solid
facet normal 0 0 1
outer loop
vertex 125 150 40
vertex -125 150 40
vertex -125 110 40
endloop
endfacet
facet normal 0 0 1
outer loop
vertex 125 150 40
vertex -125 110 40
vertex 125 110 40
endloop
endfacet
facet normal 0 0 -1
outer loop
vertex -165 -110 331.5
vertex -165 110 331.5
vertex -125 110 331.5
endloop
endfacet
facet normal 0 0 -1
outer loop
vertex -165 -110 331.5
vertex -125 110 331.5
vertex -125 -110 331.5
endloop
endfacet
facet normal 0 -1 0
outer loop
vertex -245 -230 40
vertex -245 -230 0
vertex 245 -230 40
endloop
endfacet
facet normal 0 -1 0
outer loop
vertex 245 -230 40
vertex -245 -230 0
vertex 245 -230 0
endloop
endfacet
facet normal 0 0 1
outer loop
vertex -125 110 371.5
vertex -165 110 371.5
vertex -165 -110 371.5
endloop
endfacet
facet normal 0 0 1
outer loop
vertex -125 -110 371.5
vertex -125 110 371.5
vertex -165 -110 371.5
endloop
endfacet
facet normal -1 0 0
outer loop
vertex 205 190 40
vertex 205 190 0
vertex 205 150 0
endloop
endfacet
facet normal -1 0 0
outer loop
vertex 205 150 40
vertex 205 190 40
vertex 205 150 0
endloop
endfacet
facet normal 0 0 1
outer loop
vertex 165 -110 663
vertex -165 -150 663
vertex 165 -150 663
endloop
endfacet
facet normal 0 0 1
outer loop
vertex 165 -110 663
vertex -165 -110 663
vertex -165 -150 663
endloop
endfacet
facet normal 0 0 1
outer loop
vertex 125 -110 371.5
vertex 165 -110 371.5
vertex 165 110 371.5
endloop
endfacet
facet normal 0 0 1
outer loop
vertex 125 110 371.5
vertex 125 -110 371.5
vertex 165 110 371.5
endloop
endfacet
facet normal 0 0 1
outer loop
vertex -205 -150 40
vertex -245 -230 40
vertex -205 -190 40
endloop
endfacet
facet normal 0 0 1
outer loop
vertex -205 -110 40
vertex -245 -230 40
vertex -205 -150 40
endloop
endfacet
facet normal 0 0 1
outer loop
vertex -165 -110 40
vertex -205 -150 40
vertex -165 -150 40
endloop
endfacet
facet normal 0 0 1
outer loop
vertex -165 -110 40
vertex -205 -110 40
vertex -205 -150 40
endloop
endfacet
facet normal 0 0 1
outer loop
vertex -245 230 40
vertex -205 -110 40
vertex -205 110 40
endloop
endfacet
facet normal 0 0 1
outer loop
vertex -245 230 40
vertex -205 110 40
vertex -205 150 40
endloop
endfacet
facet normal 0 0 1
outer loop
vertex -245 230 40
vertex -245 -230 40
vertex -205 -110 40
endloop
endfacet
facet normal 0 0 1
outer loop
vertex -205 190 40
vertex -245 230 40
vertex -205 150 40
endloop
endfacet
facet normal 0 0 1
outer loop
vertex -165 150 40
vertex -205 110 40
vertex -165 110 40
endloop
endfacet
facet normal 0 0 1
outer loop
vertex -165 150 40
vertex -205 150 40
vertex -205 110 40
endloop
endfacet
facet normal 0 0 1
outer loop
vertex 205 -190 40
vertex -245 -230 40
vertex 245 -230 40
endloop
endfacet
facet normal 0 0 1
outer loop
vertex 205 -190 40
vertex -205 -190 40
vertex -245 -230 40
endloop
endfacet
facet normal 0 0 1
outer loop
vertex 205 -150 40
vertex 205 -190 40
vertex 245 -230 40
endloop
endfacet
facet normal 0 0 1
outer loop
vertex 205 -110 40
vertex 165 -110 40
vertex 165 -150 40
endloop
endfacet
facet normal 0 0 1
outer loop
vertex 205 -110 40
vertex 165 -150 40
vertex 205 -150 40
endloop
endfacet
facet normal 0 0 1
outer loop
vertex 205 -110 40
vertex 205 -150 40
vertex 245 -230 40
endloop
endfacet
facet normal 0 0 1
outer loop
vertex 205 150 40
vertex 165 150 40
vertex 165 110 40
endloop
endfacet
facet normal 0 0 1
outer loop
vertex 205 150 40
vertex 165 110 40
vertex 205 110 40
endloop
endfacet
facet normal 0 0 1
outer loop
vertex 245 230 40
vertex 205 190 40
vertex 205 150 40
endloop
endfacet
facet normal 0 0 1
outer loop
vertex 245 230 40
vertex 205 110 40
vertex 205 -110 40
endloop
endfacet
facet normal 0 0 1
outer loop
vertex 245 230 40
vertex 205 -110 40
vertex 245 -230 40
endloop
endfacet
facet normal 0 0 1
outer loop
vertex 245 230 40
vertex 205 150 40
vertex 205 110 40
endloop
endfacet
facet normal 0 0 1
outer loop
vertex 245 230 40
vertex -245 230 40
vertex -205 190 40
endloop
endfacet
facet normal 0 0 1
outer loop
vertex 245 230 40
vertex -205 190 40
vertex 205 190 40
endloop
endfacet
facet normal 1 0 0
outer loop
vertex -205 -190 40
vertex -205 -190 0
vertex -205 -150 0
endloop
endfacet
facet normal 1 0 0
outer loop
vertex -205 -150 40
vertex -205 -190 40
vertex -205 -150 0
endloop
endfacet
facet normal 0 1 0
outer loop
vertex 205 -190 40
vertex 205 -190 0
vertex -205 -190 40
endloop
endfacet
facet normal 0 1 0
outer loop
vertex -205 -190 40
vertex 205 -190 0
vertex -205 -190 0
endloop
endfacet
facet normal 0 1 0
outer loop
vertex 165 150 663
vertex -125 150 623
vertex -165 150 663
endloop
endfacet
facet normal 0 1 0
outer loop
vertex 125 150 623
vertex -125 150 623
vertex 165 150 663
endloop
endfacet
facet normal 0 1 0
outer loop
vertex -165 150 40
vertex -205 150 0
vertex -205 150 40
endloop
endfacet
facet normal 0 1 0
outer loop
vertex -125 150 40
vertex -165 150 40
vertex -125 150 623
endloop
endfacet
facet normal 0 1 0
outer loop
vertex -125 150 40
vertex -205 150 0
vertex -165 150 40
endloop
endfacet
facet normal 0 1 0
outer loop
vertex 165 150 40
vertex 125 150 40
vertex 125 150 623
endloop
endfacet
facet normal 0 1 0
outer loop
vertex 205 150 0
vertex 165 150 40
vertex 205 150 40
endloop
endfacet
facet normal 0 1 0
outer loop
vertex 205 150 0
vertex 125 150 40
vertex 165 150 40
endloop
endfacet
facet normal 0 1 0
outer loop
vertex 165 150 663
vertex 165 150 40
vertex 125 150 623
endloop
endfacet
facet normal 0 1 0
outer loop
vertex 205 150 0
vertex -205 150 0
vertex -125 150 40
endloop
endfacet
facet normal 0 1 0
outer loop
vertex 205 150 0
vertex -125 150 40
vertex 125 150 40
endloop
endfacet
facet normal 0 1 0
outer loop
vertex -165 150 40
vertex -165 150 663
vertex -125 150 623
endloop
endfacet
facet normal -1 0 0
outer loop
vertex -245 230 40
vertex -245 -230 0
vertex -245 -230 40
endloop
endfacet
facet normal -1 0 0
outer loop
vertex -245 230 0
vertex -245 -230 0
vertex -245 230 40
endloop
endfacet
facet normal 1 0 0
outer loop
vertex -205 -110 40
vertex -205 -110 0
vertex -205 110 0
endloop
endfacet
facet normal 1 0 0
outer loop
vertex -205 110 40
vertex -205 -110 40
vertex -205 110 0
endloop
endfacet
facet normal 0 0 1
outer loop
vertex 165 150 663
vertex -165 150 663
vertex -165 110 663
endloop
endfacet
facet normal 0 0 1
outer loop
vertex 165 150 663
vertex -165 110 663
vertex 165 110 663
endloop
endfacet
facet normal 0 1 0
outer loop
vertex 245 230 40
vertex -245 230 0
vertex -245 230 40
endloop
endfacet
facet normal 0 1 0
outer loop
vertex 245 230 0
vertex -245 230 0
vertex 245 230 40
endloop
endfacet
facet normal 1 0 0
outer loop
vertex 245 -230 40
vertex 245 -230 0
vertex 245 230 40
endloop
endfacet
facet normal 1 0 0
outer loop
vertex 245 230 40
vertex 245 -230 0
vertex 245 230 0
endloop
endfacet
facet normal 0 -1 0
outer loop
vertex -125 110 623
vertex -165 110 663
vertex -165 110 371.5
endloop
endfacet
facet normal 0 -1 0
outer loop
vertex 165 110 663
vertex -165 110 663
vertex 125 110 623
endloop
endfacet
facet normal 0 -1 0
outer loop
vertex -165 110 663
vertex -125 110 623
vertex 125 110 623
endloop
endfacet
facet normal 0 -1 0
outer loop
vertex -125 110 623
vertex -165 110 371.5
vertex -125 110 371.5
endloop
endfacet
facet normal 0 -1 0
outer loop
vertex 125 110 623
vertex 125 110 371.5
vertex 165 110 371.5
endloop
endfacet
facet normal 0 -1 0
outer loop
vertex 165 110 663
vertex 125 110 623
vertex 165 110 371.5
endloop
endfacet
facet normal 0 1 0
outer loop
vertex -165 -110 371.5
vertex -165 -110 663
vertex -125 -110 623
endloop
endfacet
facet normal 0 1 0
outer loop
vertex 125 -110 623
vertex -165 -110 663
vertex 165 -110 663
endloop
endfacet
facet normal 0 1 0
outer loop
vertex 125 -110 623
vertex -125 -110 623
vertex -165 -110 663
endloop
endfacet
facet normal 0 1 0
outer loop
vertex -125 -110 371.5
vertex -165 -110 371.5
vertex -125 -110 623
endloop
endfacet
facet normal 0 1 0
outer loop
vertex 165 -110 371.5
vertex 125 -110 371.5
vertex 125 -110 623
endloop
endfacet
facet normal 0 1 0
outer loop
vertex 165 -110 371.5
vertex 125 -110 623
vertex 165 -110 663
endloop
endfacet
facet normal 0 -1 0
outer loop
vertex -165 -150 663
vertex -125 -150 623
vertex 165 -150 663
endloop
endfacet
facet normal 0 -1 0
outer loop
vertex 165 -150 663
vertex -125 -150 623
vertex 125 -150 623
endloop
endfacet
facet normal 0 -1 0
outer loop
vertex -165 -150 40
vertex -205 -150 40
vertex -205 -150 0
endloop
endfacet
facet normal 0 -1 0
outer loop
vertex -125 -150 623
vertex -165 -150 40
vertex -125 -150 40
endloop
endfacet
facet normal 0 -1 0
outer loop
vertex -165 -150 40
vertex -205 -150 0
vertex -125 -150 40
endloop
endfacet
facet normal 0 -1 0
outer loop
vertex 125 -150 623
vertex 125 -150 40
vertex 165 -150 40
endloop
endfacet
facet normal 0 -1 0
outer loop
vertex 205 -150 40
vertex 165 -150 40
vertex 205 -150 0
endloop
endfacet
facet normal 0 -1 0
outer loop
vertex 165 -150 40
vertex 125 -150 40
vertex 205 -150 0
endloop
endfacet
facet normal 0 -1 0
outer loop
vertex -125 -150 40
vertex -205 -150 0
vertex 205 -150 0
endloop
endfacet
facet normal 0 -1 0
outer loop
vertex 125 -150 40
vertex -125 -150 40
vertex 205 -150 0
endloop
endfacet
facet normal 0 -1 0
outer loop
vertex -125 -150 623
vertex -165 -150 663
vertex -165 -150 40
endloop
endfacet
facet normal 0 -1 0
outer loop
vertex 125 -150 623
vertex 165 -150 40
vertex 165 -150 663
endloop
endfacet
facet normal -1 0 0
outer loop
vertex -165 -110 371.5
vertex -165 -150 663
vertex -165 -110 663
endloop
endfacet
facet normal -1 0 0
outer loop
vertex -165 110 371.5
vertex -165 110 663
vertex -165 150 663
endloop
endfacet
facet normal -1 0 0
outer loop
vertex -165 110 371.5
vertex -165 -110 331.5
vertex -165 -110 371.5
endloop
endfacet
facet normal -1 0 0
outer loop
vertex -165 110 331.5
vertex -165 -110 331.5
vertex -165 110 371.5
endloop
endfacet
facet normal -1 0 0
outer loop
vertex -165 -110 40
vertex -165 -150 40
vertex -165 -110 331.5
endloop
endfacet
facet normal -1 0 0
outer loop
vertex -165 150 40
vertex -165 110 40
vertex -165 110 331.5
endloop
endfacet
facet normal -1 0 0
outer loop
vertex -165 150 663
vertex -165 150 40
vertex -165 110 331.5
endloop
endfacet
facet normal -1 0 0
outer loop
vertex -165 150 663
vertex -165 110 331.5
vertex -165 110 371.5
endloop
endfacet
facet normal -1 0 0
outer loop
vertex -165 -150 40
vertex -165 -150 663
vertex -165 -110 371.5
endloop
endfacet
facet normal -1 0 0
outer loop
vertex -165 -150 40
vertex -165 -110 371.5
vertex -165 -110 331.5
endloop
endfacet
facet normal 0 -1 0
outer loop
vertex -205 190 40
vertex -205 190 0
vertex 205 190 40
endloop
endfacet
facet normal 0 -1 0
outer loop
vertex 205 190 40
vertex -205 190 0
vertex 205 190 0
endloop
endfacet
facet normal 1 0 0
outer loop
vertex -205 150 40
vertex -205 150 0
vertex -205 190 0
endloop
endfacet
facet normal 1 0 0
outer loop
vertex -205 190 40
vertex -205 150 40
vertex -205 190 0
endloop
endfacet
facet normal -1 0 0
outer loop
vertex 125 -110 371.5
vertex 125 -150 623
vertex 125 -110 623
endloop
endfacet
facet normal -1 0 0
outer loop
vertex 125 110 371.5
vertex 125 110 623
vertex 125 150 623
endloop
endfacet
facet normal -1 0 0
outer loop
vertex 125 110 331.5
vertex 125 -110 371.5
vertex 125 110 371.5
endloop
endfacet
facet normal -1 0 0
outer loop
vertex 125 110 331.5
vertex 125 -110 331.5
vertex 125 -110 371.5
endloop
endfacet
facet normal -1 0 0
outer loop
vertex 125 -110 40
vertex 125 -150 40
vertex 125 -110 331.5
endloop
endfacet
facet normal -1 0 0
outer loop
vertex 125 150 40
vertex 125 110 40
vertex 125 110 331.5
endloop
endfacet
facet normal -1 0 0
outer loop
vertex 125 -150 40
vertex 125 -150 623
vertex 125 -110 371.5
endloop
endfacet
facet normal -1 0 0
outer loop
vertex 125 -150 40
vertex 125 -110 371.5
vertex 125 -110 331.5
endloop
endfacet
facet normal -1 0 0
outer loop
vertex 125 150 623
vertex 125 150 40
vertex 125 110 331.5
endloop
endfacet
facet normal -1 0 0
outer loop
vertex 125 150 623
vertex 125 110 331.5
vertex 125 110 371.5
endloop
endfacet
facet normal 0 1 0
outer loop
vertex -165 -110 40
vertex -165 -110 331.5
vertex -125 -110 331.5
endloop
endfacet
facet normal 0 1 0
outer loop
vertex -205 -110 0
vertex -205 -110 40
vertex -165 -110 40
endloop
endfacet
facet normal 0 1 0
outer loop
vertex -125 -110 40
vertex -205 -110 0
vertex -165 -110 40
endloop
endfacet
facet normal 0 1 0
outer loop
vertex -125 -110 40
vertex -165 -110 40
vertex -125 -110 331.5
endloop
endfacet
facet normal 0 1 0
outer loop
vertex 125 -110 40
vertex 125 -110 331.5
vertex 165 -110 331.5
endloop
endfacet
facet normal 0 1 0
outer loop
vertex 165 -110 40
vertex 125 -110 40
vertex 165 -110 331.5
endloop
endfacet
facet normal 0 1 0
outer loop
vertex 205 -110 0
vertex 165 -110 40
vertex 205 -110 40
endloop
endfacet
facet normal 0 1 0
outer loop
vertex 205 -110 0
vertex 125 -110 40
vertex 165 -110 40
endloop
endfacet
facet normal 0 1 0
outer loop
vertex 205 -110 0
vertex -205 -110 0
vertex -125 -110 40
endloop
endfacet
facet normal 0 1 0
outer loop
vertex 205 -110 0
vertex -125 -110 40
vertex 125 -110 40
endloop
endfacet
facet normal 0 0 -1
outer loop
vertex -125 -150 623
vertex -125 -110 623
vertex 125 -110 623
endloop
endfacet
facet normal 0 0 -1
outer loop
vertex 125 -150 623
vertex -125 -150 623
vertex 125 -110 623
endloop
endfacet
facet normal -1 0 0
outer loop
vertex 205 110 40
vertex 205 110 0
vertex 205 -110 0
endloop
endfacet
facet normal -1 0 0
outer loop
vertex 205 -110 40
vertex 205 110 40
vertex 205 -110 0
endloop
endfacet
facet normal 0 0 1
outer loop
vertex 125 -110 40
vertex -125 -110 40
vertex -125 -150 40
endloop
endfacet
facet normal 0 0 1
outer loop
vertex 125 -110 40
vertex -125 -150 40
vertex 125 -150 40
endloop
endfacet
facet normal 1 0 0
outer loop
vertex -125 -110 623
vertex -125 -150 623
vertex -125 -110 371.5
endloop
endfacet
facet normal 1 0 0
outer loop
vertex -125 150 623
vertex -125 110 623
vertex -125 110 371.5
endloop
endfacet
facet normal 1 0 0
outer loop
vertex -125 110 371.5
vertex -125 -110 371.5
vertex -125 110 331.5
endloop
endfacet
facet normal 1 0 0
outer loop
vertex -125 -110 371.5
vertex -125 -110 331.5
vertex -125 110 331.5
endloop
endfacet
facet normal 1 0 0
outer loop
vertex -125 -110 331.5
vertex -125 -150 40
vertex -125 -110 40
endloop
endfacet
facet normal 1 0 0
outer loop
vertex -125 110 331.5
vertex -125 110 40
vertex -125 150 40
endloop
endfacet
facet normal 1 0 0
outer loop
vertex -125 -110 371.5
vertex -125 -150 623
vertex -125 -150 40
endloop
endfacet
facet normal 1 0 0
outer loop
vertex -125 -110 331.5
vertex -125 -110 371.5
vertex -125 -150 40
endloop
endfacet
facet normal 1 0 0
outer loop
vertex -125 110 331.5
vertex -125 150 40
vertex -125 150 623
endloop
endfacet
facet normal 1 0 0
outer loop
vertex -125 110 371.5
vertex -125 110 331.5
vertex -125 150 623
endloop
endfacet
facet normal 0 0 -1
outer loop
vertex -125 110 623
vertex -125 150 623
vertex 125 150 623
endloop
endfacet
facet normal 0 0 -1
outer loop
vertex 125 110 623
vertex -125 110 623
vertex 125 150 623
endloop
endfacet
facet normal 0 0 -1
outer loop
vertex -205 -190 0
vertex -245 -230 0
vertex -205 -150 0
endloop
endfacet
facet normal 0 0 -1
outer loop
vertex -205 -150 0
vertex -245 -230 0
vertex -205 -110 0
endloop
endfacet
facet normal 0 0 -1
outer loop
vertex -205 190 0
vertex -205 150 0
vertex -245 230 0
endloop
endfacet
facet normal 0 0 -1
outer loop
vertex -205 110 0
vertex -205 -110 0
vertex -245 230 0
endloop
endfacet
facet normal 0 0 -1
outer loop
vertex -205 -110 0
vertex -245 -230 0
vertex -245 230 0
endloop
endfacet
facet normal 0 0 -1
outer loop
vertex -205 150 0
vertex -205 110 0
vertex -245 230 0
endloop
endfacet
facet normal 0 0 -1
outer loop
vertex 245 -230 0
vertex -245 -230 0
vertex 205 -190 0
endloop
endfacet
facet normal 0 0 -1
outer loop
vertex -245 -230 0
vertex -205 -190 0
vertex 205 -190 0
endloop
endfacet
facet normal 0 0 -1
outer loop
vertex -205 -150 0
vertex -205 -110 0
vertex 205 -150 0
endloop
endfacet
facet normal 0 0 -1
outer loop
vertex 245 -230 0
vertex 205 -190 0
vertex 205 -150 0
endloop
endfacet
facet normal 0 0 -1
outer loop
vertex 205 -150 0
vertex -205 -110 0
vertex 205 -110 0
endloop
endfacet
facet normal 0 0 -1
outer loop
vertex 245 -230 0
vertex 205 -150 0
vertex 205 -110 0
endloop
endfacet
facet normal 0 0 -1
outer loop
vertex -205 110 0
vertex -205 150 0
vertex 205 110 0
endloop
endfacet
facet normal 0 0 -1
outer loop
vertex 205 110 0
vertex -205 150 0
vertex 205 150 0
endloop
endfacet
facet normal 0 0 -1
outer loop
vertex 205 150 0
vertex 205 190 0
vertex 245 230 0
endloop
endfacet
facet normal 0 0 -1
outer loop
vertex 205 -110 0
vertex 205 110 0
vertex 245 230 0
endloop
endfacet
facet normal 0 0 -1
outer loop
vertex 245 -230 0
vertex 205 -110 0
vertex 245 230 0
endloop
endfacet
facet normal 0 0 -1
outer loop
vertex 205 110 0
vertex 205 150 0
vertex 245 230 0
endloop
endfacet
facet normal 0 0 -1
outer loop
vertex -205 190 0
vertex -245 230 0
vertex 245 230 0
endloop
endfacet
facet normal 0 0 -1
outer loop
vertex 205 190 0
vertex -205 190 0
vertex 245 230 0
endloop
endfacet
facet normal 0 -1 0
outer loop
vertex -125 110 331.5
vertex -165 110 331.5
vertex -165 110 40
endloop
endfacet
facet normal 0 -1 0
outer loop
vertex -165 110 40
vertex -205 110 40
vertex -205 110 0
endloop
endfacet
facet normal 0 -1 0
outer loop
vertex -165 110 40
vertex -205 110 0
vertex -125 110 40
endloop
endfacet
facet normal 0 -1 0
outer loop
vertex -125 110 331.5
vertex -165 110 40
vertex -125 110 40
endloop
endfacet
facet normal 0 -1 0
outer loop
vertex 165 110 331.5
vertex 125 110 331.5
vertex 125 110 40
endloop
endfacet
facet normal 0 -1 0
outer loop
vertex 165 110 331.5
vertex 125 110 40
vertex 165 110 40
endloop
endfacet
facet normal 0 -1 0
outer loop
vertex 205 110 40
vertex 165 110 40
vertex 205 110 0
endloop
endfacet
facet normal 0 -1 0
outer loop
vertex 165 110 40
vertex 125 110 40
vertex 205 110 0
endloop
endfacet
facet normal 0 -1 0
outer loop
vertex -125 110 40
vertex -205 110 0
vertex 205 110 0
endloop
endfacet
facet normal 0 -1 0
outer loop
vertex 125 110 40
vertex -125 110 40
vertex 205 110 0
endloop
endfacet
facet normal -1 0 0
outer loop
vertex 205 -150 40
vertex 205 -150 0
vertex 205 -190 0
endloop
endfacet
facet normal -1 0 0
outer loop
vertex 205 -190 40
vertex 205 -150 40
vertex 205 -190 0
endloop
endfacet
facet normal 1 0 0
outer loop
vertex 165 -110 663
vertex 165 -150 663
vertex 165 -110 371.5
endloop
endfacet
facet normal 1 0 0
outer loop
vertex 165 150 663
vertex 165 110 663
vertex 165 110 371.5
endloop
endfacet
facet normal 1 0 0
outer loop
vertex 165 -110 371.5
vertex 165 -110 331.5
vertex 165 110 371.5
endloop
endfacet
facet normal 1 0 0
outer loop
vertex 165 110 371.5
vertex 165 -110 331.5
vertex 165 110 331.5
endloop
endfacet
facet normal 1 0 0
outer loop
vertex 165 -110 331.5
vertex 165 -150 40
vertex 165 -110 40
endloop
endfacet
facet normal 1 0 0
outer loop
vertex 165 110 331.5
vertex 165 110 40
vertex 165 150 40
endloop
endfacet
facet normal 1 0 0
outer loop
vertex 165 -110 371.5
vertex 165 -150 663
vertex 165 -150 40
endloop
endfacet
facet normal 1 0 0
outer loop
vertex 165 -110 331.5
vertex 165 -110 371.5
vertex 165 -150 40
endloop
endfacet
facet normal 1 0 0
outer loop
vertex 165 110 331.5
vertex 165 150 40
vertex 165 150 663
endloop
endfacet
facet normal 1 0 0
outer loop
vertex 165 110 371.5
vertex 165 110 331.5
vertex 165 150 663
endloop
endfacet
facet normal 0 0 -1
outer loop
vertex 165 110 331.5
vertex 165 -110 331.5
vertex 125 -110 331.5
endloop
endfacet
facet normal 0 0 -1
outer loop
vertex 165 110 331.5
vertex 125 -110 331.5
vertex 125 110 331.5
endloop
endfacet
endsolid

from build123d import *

# Parameters (mm, degrees)
F0_W     = 490
F0_H     = 460
F0_W_2   = 410
F0_H_2   = 40
F1_DEPTH = 40
F2_W     = 40
F2_H     = 40
F3_DEPTH = 623
F4_W     = 290
F4_H     = 40
F4_W_2   = 330
F5_DEPTH = 40
F6_W     = 220
F6_H     = 40
F7_DEPTH = 40
F8_W     = 220
F8_H     = 40
F9_DEPTH = 40


with BuildPart() as f1:
    # F0 (on Top) → F1 (new body)
    with BuildSketch(Plane.XY):
        Rectangle(F0_W, F0_H)
        Polygon((205, -150), (205, -190), (-205, -190), (-205, -150), (-205, -110), (-205, 110), (-205, 150), (-205, 190), (205, 190), (205, 150), (205, 110), (205, -110), align=None, mode=Mode.SUBTRACT)
        with Locations((0, 130)):
            Rectangle(F0_W_2, F0_H_2)
        with Locations((0, -130)):
            Rectangle(F0_W_2, F0_H_2)
    extrude(amount=F1_DEPTH)

    # F2 (on face) → F3 (join)
    with BuildSketch(Plane.XY.offset(40)):
        with Locations((-145, 130)):
            Rectangle(F2_W, F2_H)
        with Locations((145, 130)):
            Rectangle(F2_W, F2_H)
        with Locations((145, -130)):
            Rectangle(F2_W, F2_H)
        with Locations((-145, -130)):
            Rectangle(F2_W, F2_H)
    extrude(amount=F3_DEPTH)

    # F4 (on face) → F5 (join)
    with BuildSketch(Plane.XY.offset(663)):
        with Locations((-20, 130)):
            Rectangle(F4_W, F4_H)
        with Locations((0, -130)):
            Rectangle(F4_W_2, F4_H)
    extrude(amount=-F5_DEPTH)

    # F6 (on face) → F7 (join)
    with BuildSketch(Plane.YZ.offset(165)):
        with Locations((0, 351.5)):
            Rectangle(F6_W, F6_H)
    extrude(amount=-F7_DEPTH)

    # F8 (on face) → F9 (join)
    with BuildSketch(Plane(origin=(-165, 0, 0), x_dir=(0, -1, 0), z_dir=(-1, 0, 0))):
        with Locations((0, 351.5)):
            Rectangle(F8_W, F8_H)
    extrude(amount=-F9_DEPTH)


solid = f1.part
